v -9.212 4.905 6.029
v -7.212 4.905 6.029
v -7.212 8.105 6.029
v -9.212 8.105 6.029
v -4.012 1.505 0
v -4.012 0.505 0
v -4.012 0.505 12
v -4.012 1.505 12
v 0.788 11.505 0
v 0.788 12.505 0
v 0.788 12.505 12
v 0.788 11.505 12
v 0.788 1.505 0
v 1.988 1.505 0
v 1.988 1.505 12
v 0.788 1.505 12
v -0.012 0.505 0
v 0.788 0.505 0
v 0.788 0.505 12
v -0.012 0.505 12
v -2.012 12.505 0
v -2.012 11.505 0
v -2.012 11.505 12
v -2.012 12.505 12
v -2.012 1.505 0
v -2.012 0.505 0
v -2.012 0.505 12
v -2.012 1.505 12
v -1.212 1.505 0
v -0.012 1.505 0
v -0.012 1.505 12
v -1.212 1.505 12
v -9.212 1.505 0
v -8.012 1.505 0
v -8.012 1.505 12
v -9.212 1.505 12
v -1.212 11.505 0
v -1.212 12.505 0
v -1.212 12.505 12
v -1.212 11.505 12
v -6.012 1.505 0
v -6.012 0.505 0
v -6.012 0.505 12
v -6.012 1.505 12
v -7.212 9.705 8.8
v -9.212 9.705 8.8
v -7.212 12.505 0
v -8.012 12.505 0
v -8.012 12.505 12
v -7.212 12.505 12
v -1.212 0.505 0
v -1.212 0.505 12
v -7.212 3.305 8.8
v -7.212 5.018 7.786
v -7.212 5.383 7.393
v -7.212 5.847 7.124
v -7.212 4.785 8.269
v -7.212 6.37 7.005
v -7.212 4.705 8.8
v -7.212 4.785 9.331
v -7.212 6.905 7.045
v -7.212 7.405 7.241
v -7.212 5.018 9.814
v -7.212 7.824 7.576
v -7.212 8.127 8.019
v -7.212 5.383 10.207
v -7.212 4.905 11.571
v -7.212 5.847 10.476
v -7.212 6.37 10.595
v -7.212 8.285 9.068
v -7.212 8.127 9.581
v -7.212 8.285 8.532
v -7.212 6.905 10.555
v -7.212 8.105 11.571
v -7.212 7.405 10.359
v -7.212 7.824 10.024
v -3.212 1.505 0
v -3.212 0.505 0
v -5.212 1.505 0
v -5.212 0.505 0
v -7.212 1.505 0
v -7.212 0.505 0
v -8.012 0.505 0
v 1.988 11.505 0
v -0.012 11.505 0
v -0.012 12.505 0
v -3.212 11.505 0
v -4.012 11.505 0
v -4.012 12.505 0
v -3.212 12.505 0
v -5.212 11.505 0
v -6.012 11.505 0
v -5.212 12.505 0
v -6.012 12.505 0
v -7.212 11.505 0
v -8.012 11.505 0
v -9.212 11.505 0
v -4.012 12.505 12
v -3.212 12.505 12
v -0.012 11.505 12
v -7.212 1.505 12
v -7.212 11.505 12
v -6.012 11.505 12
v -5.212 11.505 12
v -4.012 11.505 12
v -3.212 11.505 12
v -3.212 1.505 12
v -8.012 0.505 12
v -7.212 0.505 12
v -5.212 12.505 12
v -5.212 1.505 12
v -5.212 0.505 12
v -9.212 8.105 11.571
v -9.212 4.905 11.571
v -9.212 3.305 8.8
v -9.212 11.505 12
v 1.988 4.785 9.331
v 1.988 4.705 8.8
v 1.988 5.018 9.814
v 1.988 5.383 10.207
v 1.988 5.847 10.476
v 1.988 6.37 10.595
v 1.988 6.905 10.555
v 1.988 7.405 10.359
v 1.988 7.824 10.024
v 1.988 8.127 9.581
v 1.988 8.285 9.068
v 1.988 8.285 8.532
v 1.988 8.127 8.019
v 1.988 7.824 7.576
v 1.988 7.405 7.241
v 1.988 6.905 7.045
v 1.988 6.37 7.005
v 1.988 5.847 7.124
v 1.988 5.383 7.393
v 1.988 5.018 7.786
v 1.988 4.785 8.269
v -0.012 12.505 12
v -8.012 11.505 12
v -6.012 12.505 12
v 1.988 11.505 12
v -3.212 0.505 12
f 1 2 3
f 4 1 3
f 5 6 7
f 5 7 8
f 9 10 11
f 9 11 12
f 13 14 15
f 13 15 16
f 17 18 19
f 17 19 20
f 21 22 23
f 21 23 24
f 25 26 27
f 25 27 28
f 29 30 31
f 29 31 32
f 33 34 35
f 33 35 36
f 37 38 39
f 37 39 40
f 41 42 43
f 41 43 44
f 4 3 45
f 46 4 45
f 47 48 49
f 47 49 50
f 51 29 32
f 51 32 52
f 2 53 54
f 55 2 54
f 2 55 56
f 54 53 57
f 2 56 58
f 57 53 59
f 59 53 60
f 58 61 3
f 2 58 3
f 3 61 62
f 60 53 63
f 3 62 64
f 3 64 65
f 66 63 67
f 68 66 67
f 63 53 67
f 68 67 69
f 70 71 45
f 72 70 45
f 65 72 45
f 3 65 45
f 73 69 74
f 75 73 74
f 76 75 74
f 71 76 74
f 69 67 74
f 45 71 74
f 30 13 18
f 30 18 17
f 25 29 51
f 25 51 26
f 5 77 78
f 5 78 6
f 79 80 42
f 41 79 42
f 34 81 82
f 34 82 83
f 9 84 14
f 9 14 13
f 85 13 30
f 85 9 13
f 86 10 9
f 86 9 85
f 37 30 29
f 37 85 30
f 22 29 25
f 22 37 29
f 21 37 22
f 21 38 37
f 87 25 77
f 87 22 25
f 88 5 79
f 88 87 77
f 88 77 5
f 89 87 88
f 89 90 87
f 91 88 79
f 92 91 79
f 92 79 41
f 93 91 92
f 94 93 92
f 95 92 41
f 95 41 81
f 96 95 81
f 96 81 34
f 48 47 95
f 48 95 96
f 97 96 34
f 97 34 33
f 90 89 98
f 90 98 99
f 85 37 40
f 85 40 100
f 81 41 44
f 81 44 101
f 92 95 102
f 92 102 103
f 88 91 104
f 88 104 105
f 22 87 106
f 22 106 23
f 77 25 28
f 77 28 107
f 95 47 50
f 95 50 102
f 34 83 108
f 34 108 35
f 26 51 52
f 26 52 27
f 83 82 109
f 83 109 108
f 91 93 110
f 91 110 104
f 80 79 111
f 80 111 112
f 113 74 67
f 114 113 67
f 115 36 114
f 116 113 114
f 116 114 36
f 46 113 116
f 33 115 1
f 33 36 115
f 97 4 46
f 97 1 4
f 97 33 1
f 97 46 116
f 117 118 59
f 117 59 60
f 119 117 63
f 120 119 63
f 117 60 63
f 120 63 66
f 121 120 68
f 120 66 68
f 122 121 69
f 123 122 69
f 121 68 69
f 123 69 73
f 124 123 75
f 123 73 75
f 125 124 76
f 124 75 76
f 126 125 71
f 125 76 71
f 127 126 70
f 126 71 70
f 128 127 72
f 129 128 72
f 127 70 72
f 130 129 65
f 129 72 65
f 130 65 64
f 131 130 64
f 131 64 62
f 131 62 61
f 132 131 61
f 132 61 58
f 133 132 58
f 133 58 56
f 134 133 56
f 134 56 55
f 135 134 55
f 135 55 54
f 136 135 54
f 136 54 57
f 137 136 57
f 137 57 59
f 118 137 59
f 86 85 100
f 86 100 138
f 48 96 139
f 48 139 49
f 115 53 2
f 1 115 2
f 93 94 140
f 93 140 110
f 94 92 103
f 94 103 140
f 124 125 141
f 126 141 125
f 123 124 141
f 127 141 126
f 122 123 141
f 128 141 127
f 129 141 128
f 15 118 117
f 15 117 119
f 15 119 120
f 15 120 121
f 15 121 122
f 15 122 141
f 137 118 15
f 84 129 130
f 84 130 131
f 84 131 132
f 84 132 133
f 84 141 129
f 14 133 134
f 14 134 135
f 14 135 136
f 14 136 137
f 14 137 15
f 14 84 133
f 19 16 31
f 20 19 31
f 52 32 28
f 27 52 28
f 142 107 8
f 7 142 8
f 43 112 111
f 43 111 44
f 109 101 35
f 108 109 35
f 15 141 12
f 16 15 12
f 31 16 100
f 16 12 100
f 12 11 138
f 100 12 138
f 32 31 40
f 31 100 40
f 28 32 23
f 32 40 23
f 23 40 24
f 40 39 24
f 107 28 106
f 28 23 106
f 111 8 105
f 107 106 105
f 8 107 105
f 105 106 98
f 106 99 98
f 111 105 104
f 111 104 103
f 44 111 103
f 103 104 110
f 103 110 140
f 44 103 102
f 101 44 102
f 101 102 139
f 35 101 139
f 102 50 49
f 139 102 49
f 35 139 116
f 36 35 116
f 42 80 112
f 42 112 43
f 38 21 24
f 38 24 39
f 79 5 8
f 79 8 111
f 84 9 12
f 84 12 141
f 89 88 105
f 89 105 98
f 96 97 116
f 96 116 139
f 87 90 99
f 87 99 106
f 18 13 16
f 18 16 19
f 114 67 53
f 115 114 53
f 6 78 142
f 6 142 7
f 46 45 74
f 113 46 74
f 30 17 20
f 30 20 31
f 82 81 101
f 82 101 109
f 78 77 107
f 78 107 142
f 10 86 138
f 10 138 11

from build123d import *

# Parameters (mm, degrees)
PAD_DEPTH       = 12
SKETCH001_R     = 1.8
POCKET_DEPTH    = 11.201
POCKET001_DEPTH = 3


with BuildPart() as part:
    # Sketch → Pad (new body)
    with BuildSketch(Plane.XY):
        Polygon((-9.211601, 11.50492), (-8.011601, 11.50492), (-8.011601, 12.50492), (-7.211601, 12.50492), (-7.211601, 11.50492), (-6.011601, 11.50492), (-6.011601, 12.50492), (-5.211601, 12.50492), (-5.211601, 11.50492), (-4.011601, 11.50492), (-4.011601, 12.50492), (-3.211601, 12.50492), (-3.211601, 11.50492), (-2.011601, 11.50492), (-2.011601, 12.50492), (-1.211601, 12.50492), (-1.211601, 11.50492), (-0.011601, 11.50492), (-0.011601, 12.50492), (0.788399, 12.50492), (0.788399, 11.50492), (1.988399, 11.50492), (1.988399, 1.50492), (0.788399, 1.50492), (0.788399, 0.50492), (-0.011601, 0.50492), (-0.011601, 1.50492), (-1.211601, 1.50492), (-1.211601, 0.50492), (-2.011601, 0.50492), (-2.011601, 1.50492), (-3.211601, 1.50492), (-3.211601, 0.50492), (-4.011601, 0.50492), (-4.011601, 1.50492), (-5.211601, 1.50492), (-5.211601, 0.50492), (-6.011601, 0.50492), (-6.011601, 1.50492), (-7.211601, 1.50492), (-7.211601, 0.50492), (-8.011601, 0.50492), (-8.011601, 1.50492), (-9.211601, 1.50492), align=None)
    extrude(amount=PAD_DEPTH)

    # Sketch001 → Pocket (cut, through all)
    with BuildSketch(Plane(origin=(-9.211601, 0, 0), x_dir=(0, -1, 0), z_dir=(-1, 0, 0))):
        with Locations((-6.50492, 8.8)):
            Circle(SKETCH001_R)
    extrude(amount=-POCKET_DEPTH, mode=Mode.SUBTRACT)

    # Sketch002 → Pocket001 (cut)
    with BuildSketch(Plane.YZ.offset(-7.211601)):
        Polygon((8.10492, 6.028719), (9.70492, 8.8), (8.10492, 11.571281), (4.90492, 11.571281), (3.30492, 8.8), (4.90492, 6.028719), align=None)
    extrude(amount=-POCKET001_DEPTH, mode=Mode.SUBTRACT)


solid = part.part
